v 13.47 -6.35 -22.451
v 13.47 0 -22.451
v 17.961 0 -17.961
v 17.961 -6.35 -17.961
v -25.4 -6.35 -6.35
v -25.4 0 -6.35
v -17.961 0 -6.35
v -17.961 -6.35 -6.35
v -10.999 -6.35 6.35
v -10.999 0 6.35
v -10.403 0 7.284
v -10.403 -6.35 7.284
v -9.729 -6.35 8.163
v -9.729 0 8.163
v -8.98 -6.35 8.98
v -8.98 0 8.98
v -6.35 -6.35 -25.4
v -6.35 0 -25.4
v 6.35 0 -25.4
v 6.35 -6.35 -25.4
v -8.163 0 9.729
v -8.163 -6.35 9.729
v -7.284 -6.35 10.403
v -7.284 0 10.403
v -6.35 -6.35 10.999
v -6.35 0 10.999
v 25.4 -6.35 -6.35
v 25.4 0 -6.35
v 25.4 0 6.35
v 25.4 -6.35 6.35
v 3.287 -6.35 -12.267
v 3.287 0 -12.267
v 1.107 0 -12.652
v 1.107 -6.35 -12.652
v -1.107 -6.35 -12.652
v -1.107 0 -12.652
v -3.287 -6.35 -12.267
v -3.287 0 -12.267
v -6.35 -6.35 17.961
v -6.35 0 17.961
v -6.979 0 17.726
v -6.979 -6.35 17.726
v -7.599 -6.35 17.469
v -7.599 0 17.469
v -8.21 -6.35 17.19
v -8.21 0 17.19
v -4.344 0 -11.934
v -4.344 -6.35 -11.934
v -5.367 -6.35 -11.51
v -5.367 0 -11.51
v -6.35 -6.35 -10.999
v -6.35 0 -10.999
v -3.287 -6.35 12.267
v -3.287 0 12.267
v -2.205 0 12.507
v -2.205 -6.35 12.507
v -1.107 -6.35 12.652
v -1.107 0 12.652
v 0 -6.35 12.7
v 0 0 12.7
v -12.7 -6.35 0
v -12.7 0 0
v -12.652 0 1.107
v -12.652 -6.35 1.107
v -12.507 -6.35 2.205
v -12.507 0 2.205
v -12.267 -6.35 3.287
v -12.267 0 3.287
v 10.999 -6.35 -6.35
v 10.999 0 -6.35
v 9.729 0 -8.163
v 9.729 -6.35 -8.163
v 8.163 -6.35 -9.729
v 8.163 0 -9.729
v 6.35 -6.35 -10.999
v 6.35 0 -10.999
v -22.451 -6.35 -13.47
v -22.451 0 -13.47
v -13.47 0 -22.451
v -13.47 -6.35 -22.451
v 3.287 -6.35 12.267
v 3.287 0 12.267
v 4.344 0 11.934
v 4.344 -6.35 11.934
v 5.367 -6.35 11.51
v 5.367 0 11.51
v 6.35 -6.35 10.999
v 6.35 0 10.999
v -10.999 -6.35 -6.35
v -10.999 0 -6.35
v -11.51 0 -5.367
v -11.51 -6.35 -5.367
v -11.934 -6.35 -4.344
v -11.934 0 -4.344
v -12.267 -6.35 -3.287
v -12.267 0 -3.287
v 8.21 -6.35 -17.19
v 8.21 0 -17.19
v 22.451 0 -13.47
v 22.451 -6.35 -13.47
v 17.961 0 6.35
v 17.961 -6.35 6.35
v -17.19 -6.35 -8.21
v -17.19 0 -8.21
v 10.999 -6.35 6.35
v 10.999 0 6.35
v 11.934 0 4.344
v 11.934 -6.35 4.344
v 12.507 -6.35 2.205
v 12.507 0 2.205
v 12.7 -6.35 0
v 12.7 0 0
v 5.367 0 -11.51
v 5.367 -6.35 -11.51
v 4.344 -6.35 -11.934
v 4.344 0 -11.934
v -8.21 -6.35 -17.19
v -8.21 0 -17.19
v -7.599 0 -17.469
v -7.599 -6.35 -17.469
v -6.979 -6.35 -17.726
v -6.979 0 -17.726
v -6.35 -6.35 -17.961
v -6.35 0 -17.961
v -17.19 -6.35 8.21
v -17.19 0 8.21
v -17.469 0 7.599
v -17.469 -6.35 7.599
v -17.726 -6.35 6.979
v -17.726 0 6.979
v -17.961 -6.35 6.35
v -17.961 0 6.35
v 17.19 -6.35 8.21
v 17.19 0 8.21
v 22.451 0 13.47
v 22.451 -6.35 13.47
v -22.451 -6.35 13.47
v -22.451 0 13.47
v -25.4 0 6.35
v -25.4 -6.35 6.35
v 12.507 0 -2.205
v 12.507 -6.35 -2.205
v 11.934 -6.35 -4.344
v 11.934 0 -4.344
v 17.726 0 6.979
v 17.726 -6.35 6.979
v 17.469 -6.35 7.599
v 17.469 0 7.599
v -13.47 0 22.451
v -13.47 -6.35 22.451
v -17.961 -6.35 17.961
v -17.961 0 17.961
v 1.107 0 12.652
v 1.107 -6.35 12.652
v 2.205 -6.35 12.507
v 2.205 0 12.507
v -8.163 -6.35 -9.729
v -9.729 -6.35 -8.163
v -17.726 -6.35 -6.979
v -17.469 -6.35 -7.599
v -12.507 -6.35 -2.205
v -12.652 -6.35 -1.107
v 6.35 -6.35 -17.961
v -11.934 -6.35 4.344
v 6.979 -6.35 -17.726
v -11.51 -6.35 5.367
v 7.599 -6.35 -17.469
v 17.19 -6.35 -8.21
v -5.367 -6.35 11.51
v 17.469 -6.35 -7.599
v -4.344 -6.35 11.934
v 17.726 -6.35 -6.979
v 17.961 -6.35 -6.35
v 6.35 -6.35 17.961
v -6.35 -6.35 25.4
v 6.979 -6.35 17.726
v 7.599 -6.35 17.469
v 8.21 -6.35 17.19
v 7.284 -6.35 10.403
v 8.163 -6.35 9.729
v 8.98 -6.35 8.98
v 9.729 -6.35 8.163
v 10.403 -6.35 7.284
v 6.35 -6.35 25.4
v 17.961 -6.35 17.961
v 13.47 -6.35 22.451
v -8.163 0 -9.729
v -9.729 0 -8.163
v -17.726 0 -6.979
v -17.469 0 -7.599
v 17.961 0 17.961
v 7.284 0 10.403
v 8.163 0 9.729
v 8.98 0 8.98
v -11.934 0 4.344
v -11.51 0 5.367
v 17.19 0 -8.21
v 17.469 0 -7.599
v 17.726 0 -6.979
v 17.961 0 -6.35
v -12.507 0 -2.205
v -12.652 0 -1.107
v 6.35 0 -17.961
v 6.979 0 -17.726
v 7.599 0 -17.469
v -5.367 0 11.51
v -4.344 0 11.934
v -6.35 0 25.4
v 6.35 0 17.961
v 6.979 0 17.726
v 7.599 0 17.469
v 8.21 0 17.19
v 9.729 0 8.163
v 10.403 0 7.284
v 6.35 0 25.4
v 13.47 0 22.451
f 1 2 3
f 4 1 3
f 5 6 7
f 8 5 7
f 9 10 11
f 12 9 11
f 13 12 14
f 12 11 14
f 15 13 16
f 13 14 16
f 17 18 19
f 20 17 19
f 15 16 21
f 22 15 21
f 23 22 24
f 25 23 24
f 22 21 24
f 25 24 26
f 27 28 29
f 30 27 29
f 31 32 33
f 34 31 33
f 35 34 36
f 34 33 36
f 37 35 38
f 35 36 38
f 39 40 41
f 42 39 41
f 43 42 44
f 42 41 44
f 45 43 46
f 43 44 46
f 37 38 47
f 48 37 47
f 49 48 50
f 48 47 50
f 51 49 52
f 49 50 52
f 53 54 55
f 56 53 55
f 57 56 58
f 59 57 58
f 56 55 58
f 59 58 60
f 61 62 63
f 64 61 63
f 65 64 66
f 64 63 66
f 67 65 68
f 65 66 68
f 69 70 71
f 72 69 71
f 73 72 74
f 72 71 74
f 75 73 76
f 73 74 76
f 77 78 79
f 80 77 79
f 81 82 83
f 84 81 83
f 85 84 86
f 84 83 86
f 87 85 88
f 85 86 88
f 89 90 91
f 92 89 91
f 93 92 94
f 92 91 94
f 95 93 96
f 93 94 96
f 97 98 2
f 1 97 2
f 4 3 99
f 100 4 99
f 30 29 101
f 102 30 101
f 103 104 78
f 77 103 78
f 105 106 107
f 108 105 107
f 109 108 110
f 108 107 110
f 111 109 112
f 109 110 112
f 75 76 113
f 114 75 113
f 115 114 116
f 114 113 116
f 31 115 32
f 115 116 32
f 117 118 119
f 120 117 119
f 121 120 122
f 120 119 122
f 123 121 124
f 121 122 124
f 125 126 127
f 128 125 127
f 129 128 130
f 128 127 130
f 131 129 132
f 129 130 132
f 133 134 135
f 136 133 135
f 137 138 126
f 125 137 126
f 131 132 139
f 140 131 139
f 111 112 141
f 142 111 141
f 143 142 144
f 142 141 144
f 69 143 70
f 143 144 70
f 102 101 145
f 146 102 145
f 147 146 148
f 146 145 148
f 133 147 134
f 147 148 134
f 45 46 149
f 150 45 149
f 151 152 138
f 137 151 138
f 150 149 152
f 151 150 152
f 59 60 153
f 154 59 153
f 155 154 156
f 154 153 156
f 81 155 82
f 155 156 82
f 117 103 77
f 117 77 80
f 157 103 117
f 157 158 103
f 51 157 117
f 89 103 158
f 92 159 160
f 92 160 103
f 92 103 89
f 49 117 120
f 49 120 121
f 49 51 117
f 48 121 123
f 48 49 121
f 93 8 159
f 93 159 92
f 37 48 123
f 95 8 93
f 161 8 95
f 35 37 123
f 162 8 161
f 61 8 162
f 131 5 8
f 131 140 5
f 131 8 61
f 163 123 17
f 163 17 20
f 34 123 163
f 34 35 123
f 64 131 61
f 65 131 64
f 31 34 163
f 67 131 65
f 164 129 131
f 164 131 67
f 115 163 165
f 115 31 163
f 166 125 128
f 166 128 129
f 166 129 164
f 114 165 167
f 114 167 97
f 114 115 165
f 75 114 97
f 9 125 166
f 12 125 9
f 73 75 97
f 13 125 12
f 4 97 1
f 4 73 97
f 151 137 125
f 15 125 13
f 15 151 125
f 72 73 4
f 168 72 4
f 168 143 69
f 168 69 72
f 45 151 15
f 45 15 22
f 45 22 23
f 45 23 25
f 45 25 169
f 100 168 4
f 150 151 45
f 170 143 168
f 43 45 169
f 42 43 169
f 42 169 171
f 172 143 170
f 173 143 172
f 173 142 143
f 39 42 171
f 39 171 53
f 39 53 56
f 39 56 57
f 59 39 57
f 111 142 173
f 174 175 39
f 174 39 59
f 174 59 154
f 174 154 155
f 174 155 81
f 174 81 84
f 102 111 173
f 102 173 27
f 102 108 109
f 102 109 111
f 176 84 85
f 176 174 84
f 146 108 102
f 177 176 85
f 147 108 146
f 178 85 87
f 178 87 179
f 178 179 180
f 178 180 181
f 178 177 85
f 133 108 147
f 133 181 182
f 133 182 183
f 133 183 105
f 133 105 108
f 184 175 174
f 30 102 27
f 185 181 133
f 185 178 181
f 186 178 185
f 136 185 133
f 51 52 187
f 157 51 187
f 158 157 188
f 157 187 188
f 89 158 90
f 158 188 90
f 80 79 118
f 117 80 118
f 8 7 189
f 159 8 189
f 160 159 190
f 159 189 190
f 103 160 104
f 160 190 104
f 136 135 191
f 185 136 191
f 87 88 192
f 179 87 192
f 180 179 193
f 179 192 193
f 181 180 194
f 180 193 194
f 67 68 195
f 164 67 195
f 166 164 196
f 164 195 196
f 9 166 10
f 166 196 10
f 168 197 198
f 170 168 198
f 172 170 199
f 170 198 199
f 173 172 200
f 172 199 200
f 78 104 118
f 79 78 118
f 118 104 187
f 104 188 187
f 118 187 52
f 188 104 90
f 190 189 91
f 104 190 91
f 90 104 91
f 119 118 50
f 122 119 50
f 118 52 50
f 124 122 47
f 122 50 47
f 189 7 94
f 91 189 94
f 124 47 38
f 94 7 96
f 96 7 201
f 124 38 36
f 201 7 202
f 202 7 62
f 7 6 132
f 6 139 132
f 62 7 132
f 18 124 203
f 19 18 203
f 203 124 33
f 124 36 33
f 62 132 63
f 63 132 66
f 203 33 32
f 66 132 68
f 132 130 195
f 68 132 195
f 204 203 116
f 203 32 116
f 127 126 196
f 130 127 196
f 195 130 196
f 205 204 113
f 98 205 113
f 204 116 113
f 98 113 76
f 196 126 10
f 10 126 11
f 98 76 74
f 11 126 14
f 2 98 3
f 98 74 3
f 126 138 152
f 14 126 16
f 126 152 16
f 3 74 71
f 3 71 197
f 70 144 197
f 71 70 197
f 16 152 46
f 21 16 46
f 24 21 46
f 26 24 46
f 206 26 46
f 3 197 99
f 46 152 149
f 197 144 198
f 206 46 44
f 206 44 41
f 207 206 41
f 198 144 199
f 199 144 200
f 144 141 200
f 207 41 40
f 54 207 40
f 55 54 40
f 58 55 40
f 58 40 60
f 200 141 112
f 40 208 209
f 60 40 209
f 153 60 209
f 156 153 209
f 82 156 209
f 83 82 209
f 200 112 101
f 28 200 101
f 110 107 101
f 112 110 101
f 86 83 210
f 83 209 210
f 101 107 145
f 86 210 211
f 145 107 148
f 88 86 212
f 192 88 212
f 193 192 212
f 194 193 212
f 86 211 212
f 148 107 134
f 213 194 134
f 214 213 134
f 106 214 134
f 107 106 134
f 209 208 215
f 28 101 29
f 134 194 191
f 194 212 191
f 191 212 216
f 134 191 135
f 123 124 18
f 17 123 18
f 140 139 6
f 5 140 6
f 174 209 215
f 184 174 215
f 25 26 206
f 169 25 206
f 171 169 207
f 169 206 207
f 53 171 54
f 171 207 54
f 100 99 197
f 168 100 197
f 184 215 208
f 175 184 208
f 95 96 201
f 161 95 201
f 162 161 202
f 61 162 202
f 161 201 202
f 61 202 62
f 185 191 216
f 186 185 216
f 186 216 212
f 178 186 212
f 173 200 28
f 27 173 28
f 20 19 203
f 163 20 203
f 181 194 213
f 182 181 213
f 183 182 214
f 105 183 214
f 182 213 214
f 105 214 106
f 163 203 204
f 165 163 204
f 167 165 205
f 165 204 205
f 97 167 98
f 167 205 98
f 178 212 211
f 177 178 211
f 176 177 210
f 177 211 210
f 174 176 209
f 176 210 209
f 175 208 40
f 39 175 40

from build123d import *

# Parameters (mm, degrees)
F1_DEPTH = 6.35


with BuildPart() as f1:
    # F0 (on Front) → F1 (new body)
    with BuildSketch(Plane.XZ):
        with BuildLine():
            Line((-25.4, 0), (-19.05, 0))
            ThreePointArc((-19.05, 0), (-18.7756525614, 3.2213926947), (-17.9605122421, 6.35))
            Line((-17.9605122421, 6.35), (-25.4, 6.35))
            Line((-25.4, 6.35), (-25.4, 0))
        make_face()
        with BuildLine():
            ThreePointArc((-17.9605122421, -6.35), (-18.7756525614, -3.2213926947), (-19.05, 0))
            Line((-19.05, 0), (-25.4, 0))
            Line((-25.4, 0), (-25.4, -6.35))
            Line((-25.4, -6.35), (-17.9605122421, -6.35))
        make_face()
        with BuildLine():
            Line((-19.05, 0), (-12.7, 0))
            ThreePointArc((-12.7, 0), (-12.5913497394, 1.6576826412), (-12.2672579939, 3.2870018728))
            Line((-12.2672579939, 3.2870018728), (-15.3302561211, 6.35))
            Line((-15.3302561211, 6.35), (-17.9605122421, 6.35))
            ThreePointArc((-17.9605122421, 6.35), (-18.7756525614, 3.2213926947), (-19.05, 0))
        make_face()
        with BuildLine():
            ThreePointArc((-12.2672579939, -3.2870018728), (-12.5913497394, -1.6576826412), (-12.7, 0))
            Line((-12.7, 0), (-19.05, 0))
            ThreePointArc((-19.05, 0), (-18.7756525614, -3.2213926947), (-17.9605122421, -6.35))
            Line((-17.9605122421, -6.35), (-15.3302561211, -6.35))
            Line((-15.3302561211, -6.35), (-12.2672579939, -3.2870018728))
        make_face()
        with BuildLine():
            ThreePointArc((-17.1901280605, 8.2098719395), (-15.5542598667, 10.9985226281), (-13.4703841816, 13.4703841816))
            Line((-13.4703841816, 13.4703841816), (-17.9605122421, 17.9605122421))
            Line((-17.9605122421, 17.9605122421), (-22.4506403027, 13.4703841816))
            Line((-22.4506403027, 13.4703841816), (-17.1901280605, 8.2098719395))
        make_face()
        with BuildLine():
            Line((-17.9605122421, 17.9605122421), (-13.4703841816, 13.4703841816))
            ThreePointArc((-13.4703841816, 13.4703841816), (-10.9985226281, 15.5542598667), (-8.2098719395, 17.1901280605))
            Line((-8.2098719395, 17.1901280605), (-13.4703841816, 22.4506403027))
            Line((-13.4703841816, 22.4506403027), (-17.9605122421, 17.9605122421))
        make_face()
        with BuildLine():
            Line((-13.4703841816, 13.4703841816), (-8.9802561211, 8.9802561211))
            ThreePointArc((-8.9802561211, 8.9802561211), (-7.7312701484, 10.0755874217), (-6.35, 10.9985226281))
            Line((-6.35, 10.9985226281), (-6.35, 15.3302561211))
            Line((-6.35, 15.3302561211), (-8.2098719395, 17.1901280605))
            ThreePointArc((-8.2098719395, 17.1901280605), (-10.9985226281, 15.5542598667), (-13.4703841816, 13.4703841816))
        make_face()
        with BuildLine():
            ThreePointArc((-10.9985226281, 6.35), (-10.0755874217, 7.7312701484), (-8.9802561211, 8.9802561211))
            Line((-8.9802561211, 8.9802561211), (-13.4703841816, 13.4703841816))
            ThreePointArc((-13.4703841816, 13.4703841816), (-15.5542598667, 10.9985226281), (-17.1901280605, 8.2098719395))
            Line((-17.1901280605, 8.2098719395), (-15.3302561211, 6.35))
            Line((-15.3302561211, 6.35), (-10.9985226281, 6.35))
        make_face()
        with BuildLine():
            ThreePointArc((-3.2870018728, 12.2672579939), (-1.6576826412, 12.5913497394), (0, 12.7))
            Line((0, 12.7), (0, 19.05))
            ThreePointArc((0, 19.05), (-3.2213926947, 18.7756525614), (-6.35, 17.9605122421))
            Line((-6.35, 17.9605122421), (-6.35, 15.3302561211))
            Line((-6.35, 15.3302561211), (-3.2870018728, 12.2672579939))
        make_face()
        with BuildLine():
            ThreePointArc((-6.35, 17.9605122421), (-3.2213926947, 18.7756525614), (0, 19.05))
            Line((0, 19.05), (0, 25.4))
            Line((0, 25.4), (-6.35, 25.4))
            Line((-6.35, 25.4), (-6.35, 17.9605122421))
        make_face()
        with BuildLine():
            Line((-6.35, 15.3302561211), (-6.35, 10.9985226281))
            ThreePointArc((-6.35, 10.9985226281), (-4.860079591, 11.7332700629), (-3.2870018728, 12.2672579939))
            Line((-3.2870018728, 12.2672579939), (-6.35, 15.3302561211))
        make_face()
        with BuildLine():
            ThreePointArc((0, 19.05), (3.2213926947, 18.7756525614), (6.35, 17.9605122421))
            Line((6.35, 17.9605122421), (6.35, 25.4))
            Line((6.35, 25.4), (0, 25.4))
            Line((0, 25.4), (0, 19.05))
        make_face()
        with BuildLine():
            Line((-8.2098719395, 17.1901280605), (-6.35, 15.3302561211))
            Line((-6.35, 15.3302561211), (-6.35, 17.9605122421))
            ThreePointArc((-6.35, 17.9605122421), (-7.2901193866, 17.5999050943), (-8.2098719395, 17.1901280605))
        make_face()
        with BuildLine():
            Line((-17.9605122421, 6.35), (-15.3302561211, 6.35))
            Line((-15.3302561211, 6.35), (-17.1901280605, 8.2098719395))
            ThreePointArc((-17.1901280605, 8.2098719395), (-17.5999050943, 7.2901193866), (-17.9605122421, 6.35))
        make_face()
        with BuildLine():
            ThreePointArc((0, 12.7), (1.6576826412, 12.5913497394), (3.2870018728, 12.2672579939))
            Line((3.2870018728, 12.2672579939), (6.35, 15.3302561211))
            Line((6.35, 15.3302561211), (6.35, 17.9605122421))
            ThreePointArc((6.35, 17.9605122421), (3.2213926947, 18.7756525614), (0, 19.05))
            Line((0, 19.05), (0, 12.7))
        make_face()
        with BuildLine():
            Line((6.35, 17.9605122421), (6.35, 15.3302561211))
            Line((6.35, 15.3302561211), (8.2098719395, 17.1901280605))
            ThreePointArc((8.2098719395, 17.1901280605), (7.2901193866, 17.5999050943), (6.35, 17.9605122421))
        make_face()
        with BuildLine():
            ThreePointArc((3.2870018728, 12.2672579939), (4.860079591, 11.7332700629), (6.35, 10.9985226281))
            Line((6.35, 10.9985226281), (6.35, 15.3302561211))
            Line((6.35, 15.3302561211), (3.2870018728, 12.2672579939))
        make_face()
        with BuildLine():
            ThreePointArc((6.35, 10.9985226281), (7.7312701484, 10.0755874217), (8.9802561211, 8.9802561211))
            Line((8.9802561211, 8.9802561211), (13.4703841816, 13.4703841816))
            ThreePointArc((13.4703841816, 13.4703841816), (10.9985226281, 15.5542598667), (8.2098719395, 17.1901280605))
            Line((8.2098719395, 17.1901280605), (6.35, 15.3302561211))
            Line((6.35, 15.3302561211), (6.35, 10.9985226281))
        make_face()
        with BuildLine():
            ThreePointArc((8.2098719395, 17.1901280605), (10.9985226281, 15.5542598667), (13.4703841816, 13.4703841816))
            Line((13.4703841816, 13.4703841816), (17.9605122421, 17.9605122421))
            Line((17.9605122421, 17.9605122421), (13.4703841816, 22.4506403027))
            Line((13.4703841816, 22.4506403027), (8.2098719395, 17.1901280605))
        make_face()
        with BuildLine():
            Line((17.9605122421, 17.9605122421), (13.4703841816, 13.4703841816))
            ThreePointArc((13.4703841816, 13.4703841816), (15.5542598667, 10.9985226281), (17.1901280605, 8.2098719395))
            Line((17.1901280605, 8.2098719395), (22.4506403027, 13.4703841816))
            Line((22.4506403027, 13.4703841816), (17.9605122421, 17.9605122421))
        make_face()
        with BuildLine():
            ThreePointArc((8.9802561211, 8.9802561211), (10.0755874217, 7.7312701484), (10.9985226281, 6.35))
            Line((10.9985226281, 6.35), (15.3302561211, 6.35))
            Line((15.3302561211, 6.35), (17.1901280605, 8.2098719395))
            ThreePointArc((17.1901280605, 8.2098719395), (15.5542598667, 10.9985226281), (13.4703841816, 13.4703841816))
            Line((13.4703841816, 13.4703841816), (8.9802561211, 8.9802561211))
        make_face()
        with BuildLine():
            ThreePointArc((10.9985226281, 6.35), (12.2672579939, 3.2870018728), (12.7, 0))
            Line((12.7, 0), (19.05, 0))
            ThreePointArc((19.05, 0), (18.7756525614, 3.2213926947), (17.9605122421, 6.35))
            Line((17.9605122421, 6.35), (15.3302561211, 6.35))
            Line((15.3302561211, 6.35), (10.9985226281, 6.35))
        make_face()
        with BuildLine():
            ThreePointArc((17.9605122421, 6.35), (18.7756525614, 3.2213926947), (19.05, 0))
            Line((19.05, 0), (25.4, 0))
            Line((25.4, 0), (25.4, 6.35))
            Line((25.4, 6.35), (17.9605122421, 6.35))
        make_face()
        with BuildLine():
            Line((17.1901280605, 8.2098719395), (15.3302561211, 6.35))
            Line((15.3302561211, 6.35), (17.9605122421, 6.35))
            ThreePointArc((17.9605122421, 6.35), (17.5999050943, 7.2901193866), (17.1901280605, 8.2098719395))
        make_face()
        with BuildLine():
            Line((25.4, 0), (19.05, 0))
            ThreePointArc((19.05, 0), (18.7756525614, -3.2213926947), (17.9605122421, -6.35))
            Line((17.9605122421, -6.35), (25.4, -6.35))
            Line((25.4, -6.35), (25.4, 0))
        make_face()
        with BuildLine():
            Line((19.05, 0), (12.7, 0))
            ThreePointArc((12.7, 0), (12.2672579939, -3.2870018728), (10.9985226281, -6.35))
            Line((10.9985226281, -6.35), (15.3302561211, -6.35))
            Line((15.3302561211, -6.35), (17.9605122421, -6.35))
            ThreePointArc((17.9605122421, -6.35), (18.7756525614, -3.2213926947), (19.05, 0))
        make_face()
        with BuildLine():
            Line((15.3302561211, -6.35), (10.9985226281, -6.35))
            ThreePointArc((10.9985226281, -6.35), (8.9802561211, -8.9802561211), (6.35, -10.9985226281))
            Line((6.35, -10.9985226281), (6.35, -15.3302561211))
            Line((6.35, -15.3302561211), (8.2098719395, -17.1901280605))
            ThreePointArc((8.2098719395, -17.1901280605), (13.4703841816, -13.4703841816), (17.1901280605, -8.2098719395))
            Line((17.1901280605, -8.2098719395), (15.3302561211, -6.35))
        make_face()
        with BuildLine():
            Line((22.4506403027, -13.4703841816), (17.1901280605, -8.2098719395))
            ThreePointArc((17.1901280605, -8.2098719395), (13.4703841816, -13.4703841816), (8.2098719395, -17.1901280605))
            Line((8.2098719395, -17.1901280605), (13.4703841816, -22.4506403027))
            Line((13.4703841816, -22.4506403027), (17.9605122421, -17.9605122421))
            Line((17.9605122421, -17.9605122421), (22.4506403027, -13.4703841816))
        make_face()
        with BuildLine():
            Line((6.35, -15.3302561211), (3.2870018728, -12.2672579939))
            ThreePointArc((3.2870018728, -12.2672579939), (0, -12.7), (-3.2870018728, -12.2672579939))
            Line((-3.2870018728, -12.2672579939), (-6.35, -15.3302561211))
            Line((-6.35, -15.3302561211), (-6.35, -17.9605122421))
            ThreePointArc((-6.35, -17.9605122421), (0, -19.05), (6.35, -17.9605122421))
            Line((6.35, -17.9605122421), (6.35, -15.3302561211))
        make_face()
        with BuildLine():
            Line((-6.35, -15.3302561211), (-6.35, -10.9985226281))
            ThreePointArc((-6.35, -10.9985226281), (-8.9802561211, -8.9802561211), (-10.9985226281, -6.35))
            Line((-10.9985226281, -6.35), (-15.3302561211, -6.35))
            Line((-15.3302561211, -6.35), (-17.1901280605, -8.2098719395))
            ThreePointArc((-17.1901280605, -8.2098719395), (-13.4703841816, -13.4703841816), (-8.2098719395, -17.1901280605))
            Line((-8.2098719395, -17.1901280605), (-6.35, -15.3302561211))
        make_face()
        with BuildLine():
            Line((-13.4703841816, -22.4506403027), (-8.2098719395, -17.1901280605))
            ThreePointArc((-8.2098719395, -17.1901280605), (-13.4703841816, -13.4703841816), (-17.1901280605, -8.2098719395))
            Line((-17.1901280605, -8.2098719395), (-22.4506403027, -13.4703841816))
            Line((-22.4506403027, -13.4703841816), (-13.4703841816, -22.4506403027))
        make_face()
        with BuildLine():
            Line((6.35, -25.4), (6.35, -17.9605122421))
            ThreePointArc((6.35, -17.9605122421), (0, -19.05), (-6.35, -17.9605122421))
            Line((-6.35, -17.9605122421), (-6.35, -25.4))
            Line((-6.35, -25.4), (0, -25.4))
            Line((0, -25.4), (6.35, -25.4))
        make_face()
        with BuildLine():
            Line((6.35, -15.3302561211), (6.35, -10.9985226281))
            ThreePointArc((6.35, -10.9985226281), (4.860079591, -11.7332700629), (3.2870018728, -12.2672579939))
            Line((3.2870018728, -12.2672579939), (6.35, -15.3302561211))
        make_face()
        with BuildLine():
            Line((-6.35, -15.3302561211), (-3.2870018728, -12.2672579939))
            ThreePointArc((-3.2870018728, -12.2672579939), (-4.860079591, -11.7332700629), (-6.35, -10.9985226281))
            Line((-6.35, -10.9985226281), (-6.35, -15.3302561211))
        make_face()
        with BuildLine():
            ThreePointArc((-10.9985226281, -6.35), (-11.7332700629, -4.860079591), (-12.2672579939, -3.2870018728))
            Line((-12.2672579939, -3.2870018728), (-15.3302561211, -6.35))
            Line((-15.3302561211, -6.35), (-10.9985226281, -6.35))
        make_face()
        with BuildLine():
            ThreePointArc((-12.2672579939, 3.2870018728), (-11.7332700629, 4.860079591), (-10.9985226281, 6.35))
            Line((-10.9985226281, 6.35), (-15.3302561211, 6.35))
            Line((-15.3302561211, 6.35), (-12.2672579939, 3.2870018728))
        make_face()
        with BuildLine():
            Line((17.9605122421, -6.35), (15.3302561211, -6.35))
            Line((15.3302561211, -6.35), (17.1901280605, -8.2098719395))
            ThreePointArc((17.1901280605, -8.2098719395), (17.5999050943, -7.2901193866), (17.9605122421, -6.35))
        make_face()
        with BuildLine():
            Line((8.2098719395, -17.1901280605), (6.35, -15.3302561211))
            Line((6.35, -15.3302561211), (6.35, -17.9605122421))
            ThreePointArc((6.35, -17.9605122421), (7.2901193866, -17.5999050943), (8.2098719395, -17.1901280605))
        make_face()
        with BuildLine():
            Line((-6.35, -17.9605122421), (-6.35, -15.3302561211))
            Line((-6.35, -15.3302561211), (-8.2098719395, -17.1901280605))
            ThreePointArc((-8.2098719395, -17.1901280605), (-7.2901193866, -17.5999050943), (-6.35, -17.9605122421))
        make_face()
        with BuildLine():
            Line((-17.1901280605, -8.2098719395), (-15.3302561211, -6.35))
            Line((-15.3302561211, -6.35), (-17.9605122421, -6.35))
            ThreePointArc((-17.9605122421, -6.35), (-17.5999050943, -7.2901193866), (-17.1901280605, -8.2098719395))
        make_face()
    extrude(amount=F1_DEPTH)


solid = f1.part
